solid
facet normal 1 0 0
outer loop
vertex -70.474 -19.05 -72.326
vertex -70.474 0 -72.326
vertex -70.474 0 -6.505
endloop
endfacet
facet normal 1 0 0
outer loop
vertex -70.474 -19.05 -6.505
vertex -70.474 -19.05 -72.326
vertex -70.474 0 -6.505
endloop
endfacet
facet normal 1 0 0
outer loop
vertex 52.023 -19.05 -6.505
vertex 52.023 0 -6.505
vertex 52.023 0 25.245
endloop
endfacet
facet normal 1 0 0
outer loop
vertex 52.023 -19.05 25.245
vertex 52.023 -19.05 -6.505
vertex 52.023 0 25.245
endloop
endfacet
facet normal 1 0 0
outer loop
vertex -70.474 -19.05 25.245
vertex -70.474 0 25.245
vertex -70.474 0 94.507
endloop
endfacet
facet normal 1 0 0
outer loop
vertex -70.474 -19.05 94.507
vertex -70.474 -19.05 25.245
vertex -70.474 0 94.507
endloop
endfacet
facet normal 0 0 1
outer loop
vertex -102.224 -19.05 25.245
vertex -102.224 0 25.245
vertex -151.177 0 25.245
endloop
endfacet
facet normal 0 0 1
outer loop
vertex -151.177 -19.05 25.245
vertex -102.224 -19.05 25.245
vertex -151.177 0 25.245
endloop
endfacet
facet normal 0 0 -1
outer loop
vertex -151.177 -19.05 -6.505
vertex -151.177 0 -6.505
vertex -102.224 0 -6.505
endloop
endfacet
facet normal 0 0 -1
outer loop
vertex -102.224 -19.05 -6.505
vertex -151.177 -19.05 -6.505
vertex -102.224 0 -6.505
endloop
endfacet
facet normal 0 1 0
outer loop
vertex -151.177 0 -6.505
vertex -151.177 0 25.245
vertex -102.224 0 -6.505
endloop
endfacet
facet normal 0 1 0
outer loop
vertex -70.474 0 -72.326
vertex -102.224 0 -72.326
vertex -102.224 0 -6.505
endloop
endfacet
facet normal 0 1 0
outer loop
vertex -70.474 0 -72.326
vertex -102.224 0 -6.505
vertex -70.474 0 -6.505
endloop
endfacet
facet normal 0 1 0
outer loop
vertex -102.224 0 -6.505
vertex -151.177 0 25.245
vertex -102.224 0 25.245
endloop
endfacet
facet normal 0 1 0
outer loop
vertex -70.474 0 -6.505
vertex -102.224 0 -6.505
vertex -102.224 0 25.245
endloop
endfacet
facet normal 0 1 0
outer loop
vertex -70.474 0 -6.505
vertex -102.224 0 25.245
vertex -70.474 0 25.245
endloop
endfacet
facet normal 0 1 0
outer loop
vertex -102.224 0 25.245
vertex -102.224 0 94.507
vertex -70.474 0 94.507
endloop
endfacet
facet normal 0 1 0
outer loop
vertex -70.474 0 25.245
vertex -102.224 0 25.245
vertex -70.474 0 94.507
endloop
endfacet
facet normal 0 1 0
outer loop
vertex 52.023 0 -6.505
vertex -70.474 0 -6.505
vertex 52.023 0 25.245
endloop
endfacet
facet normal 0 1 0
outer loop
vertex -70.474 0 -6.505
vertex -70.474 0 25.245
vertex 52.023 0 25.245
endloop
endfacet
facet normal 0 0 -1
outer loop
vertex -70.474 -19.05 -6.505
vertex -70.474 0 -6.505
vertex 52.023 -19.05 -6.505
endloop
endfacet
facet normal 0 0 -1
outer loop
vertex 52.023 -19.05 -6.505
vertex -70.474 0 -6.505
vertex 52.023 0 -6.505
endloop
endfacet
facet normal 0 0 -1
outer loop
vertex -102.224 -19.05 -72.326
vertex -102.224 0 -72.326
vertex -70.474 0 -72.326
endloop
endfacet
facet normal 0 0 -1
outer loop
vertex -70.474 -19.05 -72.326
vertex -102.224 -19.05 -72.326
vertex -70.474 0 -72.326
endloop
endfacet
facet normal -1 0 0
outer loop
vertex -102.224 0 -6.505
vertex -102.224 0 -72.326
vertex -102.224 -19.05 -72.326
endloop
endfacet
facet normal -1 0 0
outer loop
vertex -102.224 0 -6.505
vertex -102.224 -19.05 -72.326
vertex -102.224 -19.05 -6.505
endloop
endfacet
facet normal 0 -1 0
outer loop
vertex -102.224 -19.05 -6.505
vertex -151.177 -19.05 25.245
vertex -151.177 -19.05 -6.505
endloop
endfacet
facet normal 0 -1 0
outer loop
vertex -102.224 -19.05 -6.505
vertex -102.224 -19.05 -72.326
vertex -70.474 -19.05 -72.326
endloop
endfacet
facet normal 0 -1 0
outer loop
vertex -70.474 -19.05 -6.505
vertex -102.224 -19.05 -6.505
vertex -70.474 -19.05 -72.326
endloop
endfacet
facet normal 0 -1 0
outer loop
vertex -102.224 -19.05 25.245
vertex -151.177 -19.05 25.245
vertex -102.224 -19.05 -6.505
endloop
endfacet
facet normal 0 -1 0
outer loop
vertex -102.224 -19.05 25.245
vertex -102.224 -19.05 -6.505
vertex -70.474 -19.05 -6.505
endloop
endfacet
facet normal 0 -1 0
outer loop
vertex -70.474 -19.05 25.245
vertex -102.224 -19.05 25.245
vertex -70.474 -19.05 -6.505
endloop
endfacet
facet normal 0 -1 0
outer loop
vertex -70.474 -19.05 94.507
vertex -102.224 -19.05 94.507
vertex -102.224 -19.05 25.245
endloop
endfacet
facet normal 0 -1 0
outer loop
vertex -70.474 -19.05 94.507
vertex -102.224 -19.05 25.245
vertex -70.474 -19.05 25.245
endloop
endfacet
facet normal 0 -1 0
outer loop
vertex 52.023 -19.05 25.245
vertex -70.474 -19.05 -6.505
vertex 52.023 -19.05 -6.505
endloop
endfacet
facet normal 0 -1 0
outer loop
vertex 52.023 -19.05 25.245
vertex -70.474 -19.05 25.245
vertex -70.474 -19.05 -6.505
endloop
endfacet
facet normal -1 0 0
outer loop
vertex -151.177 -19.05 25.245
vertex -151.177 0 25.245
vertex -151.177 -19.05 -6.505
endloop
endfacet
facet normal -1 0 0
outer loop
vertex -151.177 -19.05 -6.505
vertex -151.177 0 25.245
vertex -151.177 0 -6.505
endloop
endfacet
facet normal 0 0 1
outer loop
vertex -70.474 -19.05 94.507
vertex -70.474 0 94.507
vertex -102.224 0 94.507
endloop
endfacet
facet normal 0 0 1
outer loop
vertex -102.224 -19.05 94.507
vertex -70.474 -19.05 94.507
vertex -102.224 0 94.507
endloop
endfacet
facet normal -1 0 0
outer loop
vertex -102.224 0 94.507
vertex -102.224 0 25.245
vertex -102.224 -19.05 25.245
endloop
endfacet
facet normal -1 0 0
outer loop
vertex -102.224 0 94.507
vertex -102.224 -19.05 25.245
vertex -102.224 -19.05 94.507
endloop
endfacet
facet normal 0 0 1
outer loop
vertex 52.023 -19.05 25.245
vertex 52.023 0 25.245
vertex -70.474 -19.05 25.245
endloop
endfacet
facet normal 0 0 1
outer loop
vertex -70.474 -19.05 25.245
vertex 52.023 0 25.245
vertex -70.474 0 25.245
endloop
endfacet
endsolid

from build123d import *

# Parameters (mm, degrees)
F0_W     = 48.9535877824
F0_H     = 15.875
F0_W_2   = 15.875
F0_H_2   = 65.8211410046
F0_W_3   = 122.4964122176
F0_H_3   = 69.2617977858
F1_DEPTH = 19.05


with BuildPart() as f1:
    # F0 (on Front) → F1 (new body)
    with BuildSketch(Plane.XZ):
        with Locations((-126.7005329192, 17.3074353337)):
            Rectangle(F0_W, F0_H)
        with Locations((-126.7005329192, 1.4324353337)):
            Rectangle(F0_W, F0_H)
        with Locations((-94.286239028, 1.4324353337)):
            Rectangle(F0_W_2, F0_H)
        with Locations((-94.286239028, -39.4156351686)):
            Rectangle(F0_W_2, F0_H_2)
        with Locations((-78.411239028, -39.4156351686)):
            Rectangle(F0_W_2, F0_H_2)
        with Locations((-78.411239028, 1.4324353337)):
            Rectangle(F0_W_2, F0_H)
        with Locations((-9.2255329192, 1.4324353337)):
            Rectangle(F0_W_3, F0_H)
        with Locations((-9.2255329192, 17.3074353337)):
            Rectangle(F0_W_3, F0_H)
        with Locations((-78.411239028, 17.3074353337)):
            Rectangle(F0_W_2, F0_H)
        with Locations((-94.286239028, 17.3074353337)):
            Rectangle(F0_W_2, F0_H)
        with Locations((-78.411239028, 59.8758342266)):
            Rectangle(F0_W_2, F0_H_3)
        with Locations((-94.286239028, 59.8758342266)):
            Rectangle(F0_W_2, F0_H_3)
    extrude(amount=F1_DEPTH)


solid = f1.part
